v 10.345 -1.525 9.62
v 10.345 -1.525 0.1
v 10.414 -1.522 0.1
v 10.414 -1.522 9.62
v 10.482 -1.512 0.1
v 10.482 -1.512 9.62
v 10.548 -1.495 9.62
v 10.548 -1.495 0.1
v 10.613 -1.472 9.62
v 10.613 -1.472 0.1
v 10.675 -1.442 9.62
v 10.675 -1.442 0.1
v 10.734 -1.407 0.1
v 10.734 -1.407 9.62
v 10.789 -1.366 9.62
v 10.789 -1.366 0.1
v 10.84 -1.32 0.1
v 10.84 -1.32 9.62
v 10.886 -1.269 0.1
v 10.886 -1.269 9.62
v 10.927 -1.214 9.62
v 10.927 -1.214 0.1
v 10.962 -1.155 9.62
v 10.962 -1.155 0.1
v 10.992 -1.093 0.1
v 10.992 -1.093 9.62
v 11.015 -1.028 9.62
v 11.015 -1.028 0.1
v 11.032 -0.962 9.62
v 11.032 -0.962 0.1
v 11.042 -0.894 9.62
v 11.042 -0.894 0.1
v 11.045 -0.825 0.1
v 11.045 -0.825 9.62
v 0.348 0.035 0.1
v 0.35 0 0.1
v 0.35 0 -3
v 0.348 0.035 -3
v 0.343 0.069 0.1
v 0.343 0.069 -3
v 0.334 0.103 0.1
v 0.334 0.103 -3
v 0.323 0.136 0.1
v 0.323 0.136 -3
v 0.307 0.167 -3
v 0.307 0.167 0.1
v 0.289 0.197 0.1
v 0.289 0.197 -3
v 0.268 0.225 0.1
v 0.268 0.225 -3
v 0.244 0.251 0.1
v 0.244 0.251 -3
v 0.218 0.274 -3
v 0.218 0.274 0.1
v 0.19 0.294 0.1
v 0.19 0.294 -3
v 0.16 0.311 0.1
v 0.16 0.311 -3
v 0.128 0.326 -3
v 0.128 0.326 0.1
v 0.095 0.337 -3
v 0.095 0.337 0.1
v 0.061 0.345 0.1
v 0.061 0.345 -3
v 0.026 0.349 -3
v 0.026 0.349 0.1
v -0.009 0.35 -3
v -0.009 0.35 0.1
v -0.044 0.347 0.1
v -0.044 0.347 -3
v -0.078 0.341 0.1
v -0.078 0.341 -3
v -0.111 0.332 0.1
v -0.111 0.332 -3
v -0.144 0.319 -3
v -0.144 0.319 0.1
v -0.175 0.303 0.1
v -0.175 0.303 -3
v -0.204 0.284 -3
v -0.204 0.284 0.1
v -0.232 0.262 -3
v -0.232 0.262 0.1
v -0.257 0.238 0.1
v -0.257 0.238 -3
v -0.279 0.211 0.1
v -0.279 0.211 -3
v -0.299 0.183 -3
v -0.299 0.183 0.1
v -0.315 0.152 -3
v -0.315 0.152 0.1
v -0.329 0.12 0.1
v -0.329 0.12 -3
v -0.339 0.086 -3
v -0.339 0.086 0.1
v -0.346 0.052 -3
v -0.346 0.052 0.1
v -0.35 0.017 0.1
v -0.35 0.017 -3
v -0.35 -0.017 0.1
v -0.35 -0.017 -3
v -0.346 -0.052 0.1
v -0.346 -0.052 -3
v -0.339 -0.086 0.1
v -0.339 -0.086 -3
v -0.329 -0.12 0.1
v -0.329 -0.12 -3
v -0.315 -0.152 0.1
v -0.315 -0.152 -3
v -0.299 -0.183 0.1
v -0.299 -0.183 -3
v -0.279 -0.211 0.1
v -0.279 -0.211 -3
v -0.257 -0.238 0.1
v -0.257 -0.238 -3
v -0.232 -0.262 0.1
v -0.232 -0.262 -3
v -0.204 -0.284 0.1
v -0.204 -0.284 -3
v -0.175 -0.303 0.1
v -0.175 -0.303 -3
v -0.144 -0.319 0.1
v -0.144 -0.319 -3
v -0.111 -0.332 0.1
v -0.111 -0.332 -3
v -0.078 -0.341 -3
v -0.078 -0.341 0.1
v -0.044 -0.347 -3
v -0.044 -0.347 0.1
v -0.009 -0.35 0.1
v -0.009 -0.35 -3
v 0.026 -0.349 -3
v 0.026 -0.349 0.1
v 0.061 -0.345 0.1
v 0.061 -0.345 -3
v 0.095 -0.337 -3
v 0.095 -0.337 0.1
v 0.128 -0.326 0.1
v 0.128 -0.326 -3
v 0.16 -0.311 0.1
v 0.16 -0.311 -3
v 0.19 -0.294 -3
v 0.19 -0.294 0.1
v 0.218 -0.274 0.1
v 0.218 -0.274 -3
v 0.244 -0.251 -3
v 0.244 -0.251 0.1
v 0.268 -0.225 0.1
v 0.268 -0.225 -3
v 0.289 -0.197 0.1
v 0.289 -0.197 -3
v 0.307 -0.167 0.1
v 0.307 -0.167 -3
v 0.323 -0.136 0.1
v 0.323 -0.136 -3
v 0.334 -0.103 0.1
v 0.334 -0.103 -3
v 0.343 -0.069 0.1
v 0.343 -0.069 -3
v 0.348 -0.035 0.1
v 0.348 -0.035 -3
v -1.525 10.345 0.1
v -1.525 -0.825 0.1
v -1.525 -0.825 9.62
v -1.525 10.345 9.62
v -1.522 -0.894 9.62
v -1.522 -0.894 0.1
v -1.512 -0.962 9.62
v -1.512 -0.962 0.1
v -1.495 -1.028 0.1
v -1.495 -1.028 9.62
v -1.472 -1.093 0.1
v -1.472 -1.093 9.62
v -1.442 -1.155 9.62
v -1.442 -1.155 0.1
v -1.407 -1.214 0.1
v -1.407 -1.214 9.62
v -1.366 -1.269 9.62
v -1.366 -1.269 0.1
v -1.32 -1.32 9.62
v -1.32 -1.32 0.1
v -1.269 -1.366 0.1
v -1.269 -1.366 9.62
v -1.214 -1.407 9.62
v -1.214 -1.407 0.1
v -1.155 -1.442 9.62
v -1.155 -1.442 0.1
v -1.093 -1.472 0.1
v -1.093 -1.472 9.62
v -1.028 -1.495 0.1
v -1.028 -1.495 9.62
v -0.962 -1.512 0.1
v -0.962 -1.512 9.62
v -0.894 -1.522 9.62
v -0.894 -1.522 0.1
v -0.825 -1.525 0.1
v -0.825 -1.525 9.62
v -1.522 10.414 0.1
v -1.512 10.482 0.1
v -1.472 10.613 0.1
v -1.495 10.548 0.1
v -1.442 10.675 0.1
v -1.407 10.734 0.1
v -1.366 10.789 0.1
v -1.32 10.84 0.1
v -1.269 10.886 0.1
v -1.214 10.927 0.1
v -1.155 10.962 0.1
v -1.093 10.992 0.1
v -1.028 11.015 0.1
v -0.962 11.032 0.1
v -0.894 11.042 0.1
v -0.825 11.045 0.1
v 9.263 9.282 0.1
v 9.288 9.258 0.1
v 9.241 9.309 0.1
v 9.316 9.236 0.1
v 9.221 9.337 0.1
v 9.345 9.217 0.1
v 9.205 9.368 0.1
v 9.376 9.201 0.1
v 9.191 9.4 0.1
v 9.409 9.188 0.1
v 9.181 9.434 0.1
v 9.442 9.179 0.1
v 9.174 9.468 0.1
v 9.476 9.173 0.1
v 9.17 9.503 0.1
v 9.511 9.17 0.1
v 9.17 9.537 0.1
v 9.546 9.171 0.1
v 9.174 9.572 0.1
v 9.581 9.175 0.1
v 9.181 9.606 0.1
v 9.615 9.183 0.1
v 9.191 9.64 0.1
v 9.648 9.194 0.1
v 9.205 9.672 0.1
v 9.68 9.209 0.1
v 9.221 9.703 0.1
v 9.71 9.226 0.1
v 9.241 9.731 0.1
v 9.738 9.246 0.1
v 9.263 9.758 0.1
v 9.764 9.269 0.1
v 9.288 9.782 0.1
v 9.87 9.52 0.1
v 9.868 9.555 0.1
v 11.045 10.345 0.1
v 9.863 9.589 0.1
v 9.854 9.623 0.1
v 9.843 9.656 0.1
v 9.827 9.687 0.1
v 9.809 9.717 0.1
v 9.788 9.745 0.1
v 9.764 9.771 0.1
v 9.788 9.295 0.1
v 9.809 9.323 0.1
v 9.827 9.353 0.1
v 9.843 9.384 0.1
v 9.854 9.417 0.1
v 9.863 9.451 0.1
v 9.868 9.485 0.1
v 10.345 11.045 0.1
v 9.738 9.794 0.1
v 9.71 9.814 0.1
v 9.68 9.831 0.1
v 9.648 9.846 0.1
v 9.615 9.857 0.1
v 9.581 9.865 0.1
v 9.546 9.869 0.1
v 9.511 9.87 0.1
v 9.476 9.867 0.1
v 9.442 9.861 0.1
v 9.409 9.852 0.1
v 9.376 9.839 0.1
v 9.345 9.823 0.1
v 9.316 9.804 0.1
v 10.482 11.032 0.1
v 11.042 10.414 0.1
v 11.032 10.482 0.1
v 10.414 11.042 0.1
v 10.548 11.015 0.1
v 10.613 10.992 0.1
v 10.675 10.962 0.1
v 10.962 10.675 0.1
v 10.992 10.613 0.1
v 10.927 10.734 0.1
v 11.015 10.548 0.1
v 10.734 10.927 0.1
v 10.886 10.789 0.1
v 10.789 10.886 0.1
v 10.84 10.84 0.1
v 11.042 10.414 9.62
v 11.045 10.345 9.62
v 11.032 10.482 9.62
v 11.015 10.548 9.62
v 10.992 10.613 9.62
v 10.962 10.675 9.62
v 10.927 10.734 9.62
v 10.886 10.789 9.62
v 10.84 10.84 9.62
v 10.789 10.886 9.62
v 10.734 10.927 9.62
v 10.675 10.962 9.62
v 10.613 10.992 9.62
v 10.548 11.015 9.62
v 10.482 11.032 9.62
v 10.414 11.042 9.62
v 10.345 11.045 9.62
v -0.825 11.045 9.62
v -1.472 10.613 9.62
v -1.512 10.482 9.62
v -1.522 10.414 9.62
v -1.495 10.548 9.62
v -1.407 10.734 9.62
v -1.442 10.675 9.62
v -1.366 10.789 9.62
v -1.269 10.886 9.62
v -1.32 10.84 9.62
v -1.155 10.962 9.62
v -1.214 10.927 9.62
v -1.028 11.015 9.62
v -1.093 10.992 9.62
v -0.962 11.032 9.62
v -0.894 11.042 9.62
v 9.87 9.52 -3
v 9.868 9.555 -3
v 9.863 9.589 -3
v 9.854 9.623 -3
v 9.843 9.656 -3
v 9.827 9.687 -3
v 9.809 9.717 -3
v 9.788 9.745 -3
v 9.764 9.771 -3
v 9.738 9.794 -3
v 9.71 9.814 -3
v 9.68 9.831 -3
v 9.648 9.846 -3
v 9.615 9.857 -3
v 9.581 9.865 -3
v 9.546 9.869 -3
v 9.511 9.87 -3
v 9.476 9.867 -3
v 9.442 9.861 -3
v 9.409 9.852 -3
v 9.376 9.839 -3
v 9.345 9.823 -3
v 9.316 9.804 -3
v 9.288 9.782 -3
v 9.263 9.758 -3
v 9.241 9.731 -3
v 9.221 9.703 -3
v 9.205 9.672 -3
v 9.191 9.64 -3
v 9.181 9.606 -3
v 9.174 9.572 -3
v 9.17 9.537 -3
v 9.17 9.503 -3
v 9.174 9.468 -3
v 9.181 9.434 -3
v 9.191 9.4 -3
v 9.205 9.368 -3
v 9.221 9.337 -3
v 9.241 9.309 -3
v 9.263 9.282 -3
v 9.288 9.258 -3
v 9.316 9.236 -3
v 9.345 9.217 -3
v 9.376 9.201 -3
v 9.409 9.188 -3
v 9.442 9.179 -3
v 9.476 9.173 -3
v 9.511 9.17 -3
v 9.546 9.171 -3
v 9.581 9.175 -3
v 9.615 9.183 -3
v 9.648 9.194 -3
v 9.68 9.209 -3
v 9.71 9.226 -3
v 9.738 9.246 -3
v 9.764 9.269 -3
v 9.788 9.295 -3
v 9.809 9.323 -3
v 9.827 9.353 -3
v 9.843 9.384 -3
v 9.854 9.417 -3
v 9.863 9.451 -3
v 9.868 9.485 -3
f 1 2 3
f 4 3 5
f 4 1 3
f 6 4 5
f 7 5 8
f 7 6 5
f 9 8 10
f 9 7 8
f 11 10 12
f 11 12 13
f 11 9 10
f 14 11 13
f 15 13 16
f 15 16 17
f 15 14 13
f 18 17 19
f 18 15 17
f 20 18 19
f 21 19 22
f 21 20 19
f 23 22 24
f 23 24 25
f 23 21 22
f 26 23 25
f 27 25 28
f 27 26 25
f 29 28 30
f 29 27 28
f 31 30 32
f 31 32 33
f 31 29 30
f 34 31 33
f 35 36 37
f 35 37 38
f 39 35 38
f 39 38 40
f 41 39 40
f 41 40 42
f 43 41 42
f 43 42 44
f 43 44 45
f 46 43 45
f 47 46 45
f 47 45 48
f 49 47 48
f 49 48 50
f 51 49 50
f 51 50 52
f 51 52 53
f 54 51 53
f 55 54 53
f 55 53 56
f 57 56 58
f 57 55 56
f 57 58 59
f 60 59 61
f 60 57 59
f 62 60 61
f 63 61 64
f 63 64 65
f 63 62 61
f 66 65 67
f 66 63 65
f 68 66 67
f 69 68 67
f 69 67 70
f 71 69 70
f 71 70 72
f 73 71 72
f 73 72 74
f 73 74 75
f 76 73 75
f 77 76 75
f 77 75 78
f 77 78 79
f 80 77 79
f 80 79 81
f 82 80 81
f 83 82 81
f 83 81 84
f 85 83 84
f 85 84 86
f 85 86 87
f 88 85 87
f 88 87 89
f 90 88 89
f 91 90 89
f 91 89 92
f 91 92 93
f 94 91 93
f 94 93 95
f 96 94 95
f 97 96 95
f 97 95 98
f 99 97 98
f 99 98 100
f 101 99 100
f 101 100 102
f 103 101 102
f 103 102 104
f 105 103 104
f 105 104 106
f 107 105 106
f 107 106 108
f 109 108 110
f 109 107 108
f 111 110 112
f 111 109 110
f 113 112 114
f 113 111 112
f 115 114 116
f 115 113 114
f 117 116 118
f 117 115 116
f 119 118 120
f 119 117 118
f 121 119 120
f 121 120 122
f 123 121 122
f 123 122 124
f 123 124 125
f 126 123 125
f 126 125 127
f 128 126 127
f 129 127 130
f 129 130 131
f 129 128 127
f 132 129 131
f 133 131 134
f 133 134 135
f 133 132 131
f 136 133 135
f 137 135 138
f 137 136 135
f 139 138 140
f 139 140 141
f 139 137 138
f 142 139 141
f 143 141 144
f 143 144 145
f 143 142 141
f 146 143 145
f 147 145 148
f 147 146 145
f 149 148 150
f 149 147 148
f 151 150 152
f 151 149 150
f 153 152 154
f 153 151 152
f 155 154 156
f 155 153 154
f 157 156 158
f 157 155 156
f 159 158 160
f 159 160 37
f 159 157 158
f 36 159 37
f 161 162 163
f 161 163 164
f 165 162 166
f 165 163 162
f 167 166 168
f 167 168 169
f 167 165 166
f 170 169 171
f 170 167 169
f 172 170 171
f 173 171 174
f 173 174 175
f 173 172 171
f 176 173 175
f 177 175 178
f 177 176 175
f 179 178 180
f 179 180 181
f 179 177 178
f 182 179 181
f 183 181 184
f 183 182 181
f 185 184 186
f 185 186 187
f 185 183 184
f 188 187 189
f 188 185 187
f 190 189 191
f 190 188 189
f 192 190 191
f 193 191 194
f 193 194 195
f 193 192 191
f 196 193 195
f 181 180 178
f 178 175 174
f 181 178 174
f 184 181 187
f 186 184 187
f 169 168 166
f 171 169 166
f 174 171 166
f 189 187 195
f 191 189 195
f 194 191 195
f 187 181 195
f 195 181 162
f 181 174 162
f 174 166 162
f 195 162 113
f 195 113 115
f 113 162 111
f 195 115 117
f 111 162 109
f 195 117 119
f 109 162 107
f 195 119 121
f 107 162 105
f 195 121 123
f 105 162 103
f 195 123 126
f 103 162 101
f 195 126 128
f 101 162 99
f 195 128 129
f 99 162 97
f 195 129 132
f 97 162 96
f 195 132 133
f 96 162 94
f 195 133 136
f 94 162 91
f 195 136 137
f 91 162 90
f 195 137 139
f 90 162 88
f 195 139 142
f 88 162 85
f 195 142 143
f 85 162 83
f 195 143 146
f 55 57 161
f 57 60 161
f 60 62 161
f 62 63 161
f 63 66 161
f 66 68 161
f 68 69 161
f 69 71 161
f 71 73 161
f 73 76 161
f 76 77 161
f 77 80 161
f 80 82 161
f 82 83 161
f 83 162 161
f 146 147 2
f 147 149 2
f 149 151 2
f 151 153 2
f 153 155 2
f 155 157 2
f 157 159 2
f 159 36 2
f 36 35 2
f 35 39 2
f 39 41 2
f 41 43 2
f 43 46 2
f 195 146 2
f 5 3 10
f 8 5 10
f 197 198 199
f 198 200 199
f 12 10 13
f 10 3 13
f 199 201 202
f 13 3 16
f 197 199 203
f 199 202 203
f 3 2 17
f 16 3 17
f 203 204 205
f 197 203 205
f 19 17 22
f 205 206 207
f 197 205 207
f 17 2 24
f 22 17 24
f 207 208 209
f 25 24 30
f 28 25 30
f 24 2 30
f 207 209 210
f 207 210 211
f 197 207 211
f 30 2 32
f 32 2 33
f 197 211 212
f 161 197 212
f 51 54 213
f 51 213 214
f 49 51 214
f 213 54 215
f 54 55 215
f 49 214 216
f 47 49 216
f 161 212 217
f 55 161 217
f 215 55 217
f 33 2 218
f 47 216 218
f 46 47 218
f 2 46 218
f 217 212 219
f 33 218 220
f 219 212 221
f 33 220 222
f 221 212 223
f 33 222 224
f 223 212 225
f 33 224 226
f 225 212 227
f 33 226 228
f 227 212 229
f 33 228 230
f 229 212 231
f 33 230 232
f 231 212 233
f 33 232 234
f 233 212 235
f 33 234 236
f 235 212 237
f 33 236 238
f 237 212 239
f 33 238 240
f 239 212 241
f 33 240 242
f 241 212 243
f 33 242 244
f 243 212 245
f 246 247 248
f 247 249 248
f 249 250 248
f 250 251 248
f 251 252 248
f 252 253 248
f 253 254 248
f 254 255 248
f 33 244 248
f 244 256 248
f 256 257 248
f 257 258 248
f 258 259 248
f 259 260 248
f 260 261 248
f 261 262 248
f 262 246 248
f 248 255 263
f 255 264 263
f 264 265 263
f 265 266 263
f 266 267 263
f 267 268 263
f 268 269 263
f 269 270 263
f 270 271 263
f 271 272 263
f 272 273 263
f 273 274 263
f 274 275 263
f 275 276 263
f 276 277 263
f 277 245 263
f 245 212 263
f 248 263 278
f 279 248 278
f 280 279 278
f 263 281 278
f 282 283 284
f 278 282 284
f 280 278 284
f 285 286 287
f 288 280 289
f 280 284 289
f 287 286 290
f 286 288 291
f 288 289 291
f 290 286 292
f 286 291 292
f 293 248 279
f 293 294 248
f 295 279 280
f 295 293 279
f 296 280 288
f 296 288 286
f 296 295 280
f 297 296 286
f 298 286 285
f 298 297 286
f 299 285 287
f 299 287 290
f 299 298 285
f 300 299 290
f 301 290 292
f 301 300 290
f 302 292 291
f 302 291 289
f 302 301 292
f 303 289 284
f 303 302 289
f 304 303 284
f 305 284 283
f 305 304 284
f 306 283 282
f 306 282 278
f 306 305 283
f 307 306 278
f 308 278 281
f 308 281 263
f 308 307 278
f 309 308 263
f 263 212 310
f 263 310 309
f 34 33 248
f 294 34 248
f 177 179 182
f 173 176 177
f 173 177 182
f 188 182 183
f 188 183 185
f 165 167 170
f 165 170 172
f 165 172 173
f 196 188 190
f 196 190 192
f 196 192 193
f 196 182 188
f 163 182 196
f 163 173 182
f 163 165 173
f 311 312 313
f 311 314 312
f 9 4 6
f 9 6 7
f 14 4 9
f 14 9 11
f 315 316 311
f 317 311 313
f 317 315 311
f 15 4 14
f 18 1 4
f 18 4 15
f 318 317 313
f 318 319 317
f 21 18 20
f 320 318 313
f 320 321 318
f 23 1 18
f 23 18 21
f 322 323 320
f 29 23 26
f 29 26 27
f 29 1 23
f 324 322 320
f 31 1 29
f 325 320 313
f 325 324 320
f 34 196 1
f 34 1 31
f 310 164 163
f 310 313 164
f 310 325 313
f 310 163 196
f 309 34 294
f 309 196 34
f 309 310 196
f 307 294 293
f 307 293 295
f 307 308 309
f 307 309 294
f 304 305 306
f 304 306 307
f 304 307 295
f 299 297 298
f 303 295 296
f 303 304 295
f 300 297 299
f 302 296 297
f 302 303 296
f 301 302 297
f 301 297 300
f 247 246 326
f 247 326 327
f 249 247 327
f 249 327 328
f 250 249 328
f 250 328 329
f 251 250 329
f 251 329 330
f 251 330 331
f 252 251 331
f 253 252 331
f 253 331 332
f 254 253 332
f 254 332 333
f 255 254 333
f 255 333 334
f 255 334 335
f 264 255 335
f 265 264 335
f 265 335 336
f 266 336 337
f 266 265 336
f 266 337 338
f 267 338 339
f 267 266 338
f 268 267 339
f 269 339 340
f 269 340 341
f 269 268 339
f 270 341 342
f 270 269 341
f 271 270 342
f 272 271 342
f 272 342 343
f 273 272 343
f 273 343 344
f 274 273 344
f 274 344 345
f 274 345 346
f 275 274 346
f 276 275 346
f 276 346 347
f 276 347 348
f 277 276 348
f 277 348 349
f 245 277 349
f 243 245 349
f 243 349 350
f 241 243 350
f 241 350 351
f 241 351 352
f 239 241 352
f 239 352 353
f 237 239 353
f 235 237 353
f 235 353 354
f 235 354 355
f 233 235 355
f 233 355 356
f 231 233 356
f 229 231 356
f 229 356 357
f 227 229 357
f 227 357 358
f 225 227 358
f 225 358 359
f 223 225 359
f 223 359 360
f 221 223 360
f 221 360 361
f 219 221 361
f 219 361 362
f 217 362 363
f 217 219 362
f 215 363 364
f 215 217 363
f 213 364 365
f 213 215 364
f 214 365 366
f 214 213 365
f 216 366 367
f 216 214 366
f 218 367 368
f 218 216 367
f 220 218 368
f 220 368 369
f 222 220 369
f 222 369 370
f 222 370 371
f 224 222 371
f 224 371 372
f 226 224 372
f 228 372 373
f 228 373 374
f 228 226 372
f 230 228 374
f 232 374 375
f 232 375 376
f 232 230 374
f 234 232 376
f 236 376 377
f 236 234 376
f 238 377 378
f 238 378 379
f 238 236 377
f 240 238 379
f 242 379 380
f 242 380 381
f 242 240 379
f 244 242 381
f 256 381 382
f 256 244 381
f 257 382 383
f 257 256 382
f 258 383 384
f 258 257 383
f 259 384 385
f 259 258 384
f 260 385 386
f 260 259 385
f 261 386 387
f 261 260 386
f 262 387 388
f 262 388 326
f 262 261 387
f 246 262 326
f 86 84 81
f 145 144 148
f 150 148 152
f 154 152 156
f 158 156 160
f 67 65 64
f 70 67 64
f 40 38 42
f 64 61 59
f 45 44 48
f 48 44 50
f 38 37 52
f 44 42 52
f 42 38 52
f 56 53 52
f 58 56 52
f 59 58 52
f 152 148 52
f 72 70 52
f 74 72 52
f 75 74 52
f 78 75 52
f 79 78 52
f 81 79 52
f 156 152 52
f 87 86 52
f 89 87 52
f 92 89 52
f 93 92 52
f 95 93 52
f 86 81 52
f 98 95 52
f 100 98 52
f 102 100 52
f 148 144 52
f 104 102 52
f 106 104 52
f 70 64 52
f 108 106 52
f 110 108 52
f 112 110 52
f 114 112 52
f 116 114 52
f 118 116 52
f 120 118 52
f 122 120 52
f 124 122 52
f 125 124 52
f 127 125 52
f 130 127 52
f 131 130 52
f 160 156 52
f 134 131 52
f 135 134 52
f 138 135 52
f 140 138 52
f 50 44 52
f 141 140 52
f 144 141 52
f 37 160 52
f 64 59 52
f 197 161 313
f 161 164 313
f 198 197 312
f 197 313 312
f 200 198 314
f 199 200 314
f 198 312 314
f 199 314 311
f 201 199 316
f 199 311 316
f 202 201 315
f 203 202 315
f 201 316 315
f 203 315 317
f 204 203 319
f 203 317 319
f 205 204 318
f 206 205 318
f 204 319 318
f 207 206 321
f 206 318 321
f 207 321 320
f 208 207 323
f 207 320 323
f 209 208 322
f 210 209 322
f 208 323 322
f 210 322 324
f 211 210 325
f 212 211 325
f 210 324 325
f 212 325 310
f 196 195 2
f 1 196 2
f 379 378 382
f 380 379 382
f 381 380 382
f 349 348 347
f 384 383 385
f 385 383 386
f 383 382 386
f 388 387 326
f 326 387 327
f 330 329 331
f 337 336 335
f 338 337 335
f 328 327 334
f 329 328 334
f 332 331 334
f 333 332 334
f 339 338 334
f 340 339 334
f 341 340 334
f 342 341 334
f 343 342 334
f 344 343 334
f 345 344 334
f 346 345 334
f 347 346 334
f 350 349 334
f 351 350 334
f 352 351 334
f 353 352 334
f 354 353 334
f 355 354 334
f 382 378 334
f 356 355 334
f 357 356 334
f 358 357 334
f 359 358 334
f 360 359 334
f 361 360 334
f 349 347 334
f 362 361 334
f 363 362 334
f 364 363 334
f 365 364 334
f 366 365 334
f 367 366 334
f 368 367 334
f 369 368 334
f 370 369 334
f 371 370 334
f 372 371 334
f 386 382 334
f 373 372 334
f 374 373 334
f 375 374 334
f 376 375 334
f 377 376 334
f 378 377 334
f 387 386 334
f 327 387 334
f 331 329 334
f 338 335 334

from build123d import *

# Parameters (mm, degrees)
SKETCH_W     = 12.57
SKETCH_H     = 12.57
PAD_DEPTH    = 9.52
FILLET_R     = 0.7
SKETCH001_R  = 0.35
PAD001_DEPTH = 3.5


with BuildPart() as fillet_body:
    # Sketch → Pad (new body)
    with BuildSketch(Plane.XY.offset(0.1)):
        with Locations((4.76, 4.76)):
            Rectangle(SKETCH_W, SKETCH_H)
    extrude(amount=PAD_DEPTH)

    # Fillet
    fillet_edges = [fillet_body.edges().sort_by_distance(p)[0] for p in [
        (11.045, -1.525, 4.86),
        (11.045, 11.045, 4.86),
        (-1.525, -1.525, 4.86),
        (-1.525, 11.045, 4.86),
    ]]
    fillet(fillet_edges, radius=FILLET_R)


with BuildPart() as pad001_mp_cp:
    # Sketch001 → Pad001 (new body)
    with BuildSketch(Plane.XY.offset(0.5)):
        Circle(SKETCH001_R)
        with Locations((9.52, 9.52)):
            Circle(SKETCH001_R)
    extrude(amount=-PAD001_DEPTH)

    # Pad001_mp_cp: union Fillet body
    add(fillet_body.part)


solid = pad001_mp_cp.part
